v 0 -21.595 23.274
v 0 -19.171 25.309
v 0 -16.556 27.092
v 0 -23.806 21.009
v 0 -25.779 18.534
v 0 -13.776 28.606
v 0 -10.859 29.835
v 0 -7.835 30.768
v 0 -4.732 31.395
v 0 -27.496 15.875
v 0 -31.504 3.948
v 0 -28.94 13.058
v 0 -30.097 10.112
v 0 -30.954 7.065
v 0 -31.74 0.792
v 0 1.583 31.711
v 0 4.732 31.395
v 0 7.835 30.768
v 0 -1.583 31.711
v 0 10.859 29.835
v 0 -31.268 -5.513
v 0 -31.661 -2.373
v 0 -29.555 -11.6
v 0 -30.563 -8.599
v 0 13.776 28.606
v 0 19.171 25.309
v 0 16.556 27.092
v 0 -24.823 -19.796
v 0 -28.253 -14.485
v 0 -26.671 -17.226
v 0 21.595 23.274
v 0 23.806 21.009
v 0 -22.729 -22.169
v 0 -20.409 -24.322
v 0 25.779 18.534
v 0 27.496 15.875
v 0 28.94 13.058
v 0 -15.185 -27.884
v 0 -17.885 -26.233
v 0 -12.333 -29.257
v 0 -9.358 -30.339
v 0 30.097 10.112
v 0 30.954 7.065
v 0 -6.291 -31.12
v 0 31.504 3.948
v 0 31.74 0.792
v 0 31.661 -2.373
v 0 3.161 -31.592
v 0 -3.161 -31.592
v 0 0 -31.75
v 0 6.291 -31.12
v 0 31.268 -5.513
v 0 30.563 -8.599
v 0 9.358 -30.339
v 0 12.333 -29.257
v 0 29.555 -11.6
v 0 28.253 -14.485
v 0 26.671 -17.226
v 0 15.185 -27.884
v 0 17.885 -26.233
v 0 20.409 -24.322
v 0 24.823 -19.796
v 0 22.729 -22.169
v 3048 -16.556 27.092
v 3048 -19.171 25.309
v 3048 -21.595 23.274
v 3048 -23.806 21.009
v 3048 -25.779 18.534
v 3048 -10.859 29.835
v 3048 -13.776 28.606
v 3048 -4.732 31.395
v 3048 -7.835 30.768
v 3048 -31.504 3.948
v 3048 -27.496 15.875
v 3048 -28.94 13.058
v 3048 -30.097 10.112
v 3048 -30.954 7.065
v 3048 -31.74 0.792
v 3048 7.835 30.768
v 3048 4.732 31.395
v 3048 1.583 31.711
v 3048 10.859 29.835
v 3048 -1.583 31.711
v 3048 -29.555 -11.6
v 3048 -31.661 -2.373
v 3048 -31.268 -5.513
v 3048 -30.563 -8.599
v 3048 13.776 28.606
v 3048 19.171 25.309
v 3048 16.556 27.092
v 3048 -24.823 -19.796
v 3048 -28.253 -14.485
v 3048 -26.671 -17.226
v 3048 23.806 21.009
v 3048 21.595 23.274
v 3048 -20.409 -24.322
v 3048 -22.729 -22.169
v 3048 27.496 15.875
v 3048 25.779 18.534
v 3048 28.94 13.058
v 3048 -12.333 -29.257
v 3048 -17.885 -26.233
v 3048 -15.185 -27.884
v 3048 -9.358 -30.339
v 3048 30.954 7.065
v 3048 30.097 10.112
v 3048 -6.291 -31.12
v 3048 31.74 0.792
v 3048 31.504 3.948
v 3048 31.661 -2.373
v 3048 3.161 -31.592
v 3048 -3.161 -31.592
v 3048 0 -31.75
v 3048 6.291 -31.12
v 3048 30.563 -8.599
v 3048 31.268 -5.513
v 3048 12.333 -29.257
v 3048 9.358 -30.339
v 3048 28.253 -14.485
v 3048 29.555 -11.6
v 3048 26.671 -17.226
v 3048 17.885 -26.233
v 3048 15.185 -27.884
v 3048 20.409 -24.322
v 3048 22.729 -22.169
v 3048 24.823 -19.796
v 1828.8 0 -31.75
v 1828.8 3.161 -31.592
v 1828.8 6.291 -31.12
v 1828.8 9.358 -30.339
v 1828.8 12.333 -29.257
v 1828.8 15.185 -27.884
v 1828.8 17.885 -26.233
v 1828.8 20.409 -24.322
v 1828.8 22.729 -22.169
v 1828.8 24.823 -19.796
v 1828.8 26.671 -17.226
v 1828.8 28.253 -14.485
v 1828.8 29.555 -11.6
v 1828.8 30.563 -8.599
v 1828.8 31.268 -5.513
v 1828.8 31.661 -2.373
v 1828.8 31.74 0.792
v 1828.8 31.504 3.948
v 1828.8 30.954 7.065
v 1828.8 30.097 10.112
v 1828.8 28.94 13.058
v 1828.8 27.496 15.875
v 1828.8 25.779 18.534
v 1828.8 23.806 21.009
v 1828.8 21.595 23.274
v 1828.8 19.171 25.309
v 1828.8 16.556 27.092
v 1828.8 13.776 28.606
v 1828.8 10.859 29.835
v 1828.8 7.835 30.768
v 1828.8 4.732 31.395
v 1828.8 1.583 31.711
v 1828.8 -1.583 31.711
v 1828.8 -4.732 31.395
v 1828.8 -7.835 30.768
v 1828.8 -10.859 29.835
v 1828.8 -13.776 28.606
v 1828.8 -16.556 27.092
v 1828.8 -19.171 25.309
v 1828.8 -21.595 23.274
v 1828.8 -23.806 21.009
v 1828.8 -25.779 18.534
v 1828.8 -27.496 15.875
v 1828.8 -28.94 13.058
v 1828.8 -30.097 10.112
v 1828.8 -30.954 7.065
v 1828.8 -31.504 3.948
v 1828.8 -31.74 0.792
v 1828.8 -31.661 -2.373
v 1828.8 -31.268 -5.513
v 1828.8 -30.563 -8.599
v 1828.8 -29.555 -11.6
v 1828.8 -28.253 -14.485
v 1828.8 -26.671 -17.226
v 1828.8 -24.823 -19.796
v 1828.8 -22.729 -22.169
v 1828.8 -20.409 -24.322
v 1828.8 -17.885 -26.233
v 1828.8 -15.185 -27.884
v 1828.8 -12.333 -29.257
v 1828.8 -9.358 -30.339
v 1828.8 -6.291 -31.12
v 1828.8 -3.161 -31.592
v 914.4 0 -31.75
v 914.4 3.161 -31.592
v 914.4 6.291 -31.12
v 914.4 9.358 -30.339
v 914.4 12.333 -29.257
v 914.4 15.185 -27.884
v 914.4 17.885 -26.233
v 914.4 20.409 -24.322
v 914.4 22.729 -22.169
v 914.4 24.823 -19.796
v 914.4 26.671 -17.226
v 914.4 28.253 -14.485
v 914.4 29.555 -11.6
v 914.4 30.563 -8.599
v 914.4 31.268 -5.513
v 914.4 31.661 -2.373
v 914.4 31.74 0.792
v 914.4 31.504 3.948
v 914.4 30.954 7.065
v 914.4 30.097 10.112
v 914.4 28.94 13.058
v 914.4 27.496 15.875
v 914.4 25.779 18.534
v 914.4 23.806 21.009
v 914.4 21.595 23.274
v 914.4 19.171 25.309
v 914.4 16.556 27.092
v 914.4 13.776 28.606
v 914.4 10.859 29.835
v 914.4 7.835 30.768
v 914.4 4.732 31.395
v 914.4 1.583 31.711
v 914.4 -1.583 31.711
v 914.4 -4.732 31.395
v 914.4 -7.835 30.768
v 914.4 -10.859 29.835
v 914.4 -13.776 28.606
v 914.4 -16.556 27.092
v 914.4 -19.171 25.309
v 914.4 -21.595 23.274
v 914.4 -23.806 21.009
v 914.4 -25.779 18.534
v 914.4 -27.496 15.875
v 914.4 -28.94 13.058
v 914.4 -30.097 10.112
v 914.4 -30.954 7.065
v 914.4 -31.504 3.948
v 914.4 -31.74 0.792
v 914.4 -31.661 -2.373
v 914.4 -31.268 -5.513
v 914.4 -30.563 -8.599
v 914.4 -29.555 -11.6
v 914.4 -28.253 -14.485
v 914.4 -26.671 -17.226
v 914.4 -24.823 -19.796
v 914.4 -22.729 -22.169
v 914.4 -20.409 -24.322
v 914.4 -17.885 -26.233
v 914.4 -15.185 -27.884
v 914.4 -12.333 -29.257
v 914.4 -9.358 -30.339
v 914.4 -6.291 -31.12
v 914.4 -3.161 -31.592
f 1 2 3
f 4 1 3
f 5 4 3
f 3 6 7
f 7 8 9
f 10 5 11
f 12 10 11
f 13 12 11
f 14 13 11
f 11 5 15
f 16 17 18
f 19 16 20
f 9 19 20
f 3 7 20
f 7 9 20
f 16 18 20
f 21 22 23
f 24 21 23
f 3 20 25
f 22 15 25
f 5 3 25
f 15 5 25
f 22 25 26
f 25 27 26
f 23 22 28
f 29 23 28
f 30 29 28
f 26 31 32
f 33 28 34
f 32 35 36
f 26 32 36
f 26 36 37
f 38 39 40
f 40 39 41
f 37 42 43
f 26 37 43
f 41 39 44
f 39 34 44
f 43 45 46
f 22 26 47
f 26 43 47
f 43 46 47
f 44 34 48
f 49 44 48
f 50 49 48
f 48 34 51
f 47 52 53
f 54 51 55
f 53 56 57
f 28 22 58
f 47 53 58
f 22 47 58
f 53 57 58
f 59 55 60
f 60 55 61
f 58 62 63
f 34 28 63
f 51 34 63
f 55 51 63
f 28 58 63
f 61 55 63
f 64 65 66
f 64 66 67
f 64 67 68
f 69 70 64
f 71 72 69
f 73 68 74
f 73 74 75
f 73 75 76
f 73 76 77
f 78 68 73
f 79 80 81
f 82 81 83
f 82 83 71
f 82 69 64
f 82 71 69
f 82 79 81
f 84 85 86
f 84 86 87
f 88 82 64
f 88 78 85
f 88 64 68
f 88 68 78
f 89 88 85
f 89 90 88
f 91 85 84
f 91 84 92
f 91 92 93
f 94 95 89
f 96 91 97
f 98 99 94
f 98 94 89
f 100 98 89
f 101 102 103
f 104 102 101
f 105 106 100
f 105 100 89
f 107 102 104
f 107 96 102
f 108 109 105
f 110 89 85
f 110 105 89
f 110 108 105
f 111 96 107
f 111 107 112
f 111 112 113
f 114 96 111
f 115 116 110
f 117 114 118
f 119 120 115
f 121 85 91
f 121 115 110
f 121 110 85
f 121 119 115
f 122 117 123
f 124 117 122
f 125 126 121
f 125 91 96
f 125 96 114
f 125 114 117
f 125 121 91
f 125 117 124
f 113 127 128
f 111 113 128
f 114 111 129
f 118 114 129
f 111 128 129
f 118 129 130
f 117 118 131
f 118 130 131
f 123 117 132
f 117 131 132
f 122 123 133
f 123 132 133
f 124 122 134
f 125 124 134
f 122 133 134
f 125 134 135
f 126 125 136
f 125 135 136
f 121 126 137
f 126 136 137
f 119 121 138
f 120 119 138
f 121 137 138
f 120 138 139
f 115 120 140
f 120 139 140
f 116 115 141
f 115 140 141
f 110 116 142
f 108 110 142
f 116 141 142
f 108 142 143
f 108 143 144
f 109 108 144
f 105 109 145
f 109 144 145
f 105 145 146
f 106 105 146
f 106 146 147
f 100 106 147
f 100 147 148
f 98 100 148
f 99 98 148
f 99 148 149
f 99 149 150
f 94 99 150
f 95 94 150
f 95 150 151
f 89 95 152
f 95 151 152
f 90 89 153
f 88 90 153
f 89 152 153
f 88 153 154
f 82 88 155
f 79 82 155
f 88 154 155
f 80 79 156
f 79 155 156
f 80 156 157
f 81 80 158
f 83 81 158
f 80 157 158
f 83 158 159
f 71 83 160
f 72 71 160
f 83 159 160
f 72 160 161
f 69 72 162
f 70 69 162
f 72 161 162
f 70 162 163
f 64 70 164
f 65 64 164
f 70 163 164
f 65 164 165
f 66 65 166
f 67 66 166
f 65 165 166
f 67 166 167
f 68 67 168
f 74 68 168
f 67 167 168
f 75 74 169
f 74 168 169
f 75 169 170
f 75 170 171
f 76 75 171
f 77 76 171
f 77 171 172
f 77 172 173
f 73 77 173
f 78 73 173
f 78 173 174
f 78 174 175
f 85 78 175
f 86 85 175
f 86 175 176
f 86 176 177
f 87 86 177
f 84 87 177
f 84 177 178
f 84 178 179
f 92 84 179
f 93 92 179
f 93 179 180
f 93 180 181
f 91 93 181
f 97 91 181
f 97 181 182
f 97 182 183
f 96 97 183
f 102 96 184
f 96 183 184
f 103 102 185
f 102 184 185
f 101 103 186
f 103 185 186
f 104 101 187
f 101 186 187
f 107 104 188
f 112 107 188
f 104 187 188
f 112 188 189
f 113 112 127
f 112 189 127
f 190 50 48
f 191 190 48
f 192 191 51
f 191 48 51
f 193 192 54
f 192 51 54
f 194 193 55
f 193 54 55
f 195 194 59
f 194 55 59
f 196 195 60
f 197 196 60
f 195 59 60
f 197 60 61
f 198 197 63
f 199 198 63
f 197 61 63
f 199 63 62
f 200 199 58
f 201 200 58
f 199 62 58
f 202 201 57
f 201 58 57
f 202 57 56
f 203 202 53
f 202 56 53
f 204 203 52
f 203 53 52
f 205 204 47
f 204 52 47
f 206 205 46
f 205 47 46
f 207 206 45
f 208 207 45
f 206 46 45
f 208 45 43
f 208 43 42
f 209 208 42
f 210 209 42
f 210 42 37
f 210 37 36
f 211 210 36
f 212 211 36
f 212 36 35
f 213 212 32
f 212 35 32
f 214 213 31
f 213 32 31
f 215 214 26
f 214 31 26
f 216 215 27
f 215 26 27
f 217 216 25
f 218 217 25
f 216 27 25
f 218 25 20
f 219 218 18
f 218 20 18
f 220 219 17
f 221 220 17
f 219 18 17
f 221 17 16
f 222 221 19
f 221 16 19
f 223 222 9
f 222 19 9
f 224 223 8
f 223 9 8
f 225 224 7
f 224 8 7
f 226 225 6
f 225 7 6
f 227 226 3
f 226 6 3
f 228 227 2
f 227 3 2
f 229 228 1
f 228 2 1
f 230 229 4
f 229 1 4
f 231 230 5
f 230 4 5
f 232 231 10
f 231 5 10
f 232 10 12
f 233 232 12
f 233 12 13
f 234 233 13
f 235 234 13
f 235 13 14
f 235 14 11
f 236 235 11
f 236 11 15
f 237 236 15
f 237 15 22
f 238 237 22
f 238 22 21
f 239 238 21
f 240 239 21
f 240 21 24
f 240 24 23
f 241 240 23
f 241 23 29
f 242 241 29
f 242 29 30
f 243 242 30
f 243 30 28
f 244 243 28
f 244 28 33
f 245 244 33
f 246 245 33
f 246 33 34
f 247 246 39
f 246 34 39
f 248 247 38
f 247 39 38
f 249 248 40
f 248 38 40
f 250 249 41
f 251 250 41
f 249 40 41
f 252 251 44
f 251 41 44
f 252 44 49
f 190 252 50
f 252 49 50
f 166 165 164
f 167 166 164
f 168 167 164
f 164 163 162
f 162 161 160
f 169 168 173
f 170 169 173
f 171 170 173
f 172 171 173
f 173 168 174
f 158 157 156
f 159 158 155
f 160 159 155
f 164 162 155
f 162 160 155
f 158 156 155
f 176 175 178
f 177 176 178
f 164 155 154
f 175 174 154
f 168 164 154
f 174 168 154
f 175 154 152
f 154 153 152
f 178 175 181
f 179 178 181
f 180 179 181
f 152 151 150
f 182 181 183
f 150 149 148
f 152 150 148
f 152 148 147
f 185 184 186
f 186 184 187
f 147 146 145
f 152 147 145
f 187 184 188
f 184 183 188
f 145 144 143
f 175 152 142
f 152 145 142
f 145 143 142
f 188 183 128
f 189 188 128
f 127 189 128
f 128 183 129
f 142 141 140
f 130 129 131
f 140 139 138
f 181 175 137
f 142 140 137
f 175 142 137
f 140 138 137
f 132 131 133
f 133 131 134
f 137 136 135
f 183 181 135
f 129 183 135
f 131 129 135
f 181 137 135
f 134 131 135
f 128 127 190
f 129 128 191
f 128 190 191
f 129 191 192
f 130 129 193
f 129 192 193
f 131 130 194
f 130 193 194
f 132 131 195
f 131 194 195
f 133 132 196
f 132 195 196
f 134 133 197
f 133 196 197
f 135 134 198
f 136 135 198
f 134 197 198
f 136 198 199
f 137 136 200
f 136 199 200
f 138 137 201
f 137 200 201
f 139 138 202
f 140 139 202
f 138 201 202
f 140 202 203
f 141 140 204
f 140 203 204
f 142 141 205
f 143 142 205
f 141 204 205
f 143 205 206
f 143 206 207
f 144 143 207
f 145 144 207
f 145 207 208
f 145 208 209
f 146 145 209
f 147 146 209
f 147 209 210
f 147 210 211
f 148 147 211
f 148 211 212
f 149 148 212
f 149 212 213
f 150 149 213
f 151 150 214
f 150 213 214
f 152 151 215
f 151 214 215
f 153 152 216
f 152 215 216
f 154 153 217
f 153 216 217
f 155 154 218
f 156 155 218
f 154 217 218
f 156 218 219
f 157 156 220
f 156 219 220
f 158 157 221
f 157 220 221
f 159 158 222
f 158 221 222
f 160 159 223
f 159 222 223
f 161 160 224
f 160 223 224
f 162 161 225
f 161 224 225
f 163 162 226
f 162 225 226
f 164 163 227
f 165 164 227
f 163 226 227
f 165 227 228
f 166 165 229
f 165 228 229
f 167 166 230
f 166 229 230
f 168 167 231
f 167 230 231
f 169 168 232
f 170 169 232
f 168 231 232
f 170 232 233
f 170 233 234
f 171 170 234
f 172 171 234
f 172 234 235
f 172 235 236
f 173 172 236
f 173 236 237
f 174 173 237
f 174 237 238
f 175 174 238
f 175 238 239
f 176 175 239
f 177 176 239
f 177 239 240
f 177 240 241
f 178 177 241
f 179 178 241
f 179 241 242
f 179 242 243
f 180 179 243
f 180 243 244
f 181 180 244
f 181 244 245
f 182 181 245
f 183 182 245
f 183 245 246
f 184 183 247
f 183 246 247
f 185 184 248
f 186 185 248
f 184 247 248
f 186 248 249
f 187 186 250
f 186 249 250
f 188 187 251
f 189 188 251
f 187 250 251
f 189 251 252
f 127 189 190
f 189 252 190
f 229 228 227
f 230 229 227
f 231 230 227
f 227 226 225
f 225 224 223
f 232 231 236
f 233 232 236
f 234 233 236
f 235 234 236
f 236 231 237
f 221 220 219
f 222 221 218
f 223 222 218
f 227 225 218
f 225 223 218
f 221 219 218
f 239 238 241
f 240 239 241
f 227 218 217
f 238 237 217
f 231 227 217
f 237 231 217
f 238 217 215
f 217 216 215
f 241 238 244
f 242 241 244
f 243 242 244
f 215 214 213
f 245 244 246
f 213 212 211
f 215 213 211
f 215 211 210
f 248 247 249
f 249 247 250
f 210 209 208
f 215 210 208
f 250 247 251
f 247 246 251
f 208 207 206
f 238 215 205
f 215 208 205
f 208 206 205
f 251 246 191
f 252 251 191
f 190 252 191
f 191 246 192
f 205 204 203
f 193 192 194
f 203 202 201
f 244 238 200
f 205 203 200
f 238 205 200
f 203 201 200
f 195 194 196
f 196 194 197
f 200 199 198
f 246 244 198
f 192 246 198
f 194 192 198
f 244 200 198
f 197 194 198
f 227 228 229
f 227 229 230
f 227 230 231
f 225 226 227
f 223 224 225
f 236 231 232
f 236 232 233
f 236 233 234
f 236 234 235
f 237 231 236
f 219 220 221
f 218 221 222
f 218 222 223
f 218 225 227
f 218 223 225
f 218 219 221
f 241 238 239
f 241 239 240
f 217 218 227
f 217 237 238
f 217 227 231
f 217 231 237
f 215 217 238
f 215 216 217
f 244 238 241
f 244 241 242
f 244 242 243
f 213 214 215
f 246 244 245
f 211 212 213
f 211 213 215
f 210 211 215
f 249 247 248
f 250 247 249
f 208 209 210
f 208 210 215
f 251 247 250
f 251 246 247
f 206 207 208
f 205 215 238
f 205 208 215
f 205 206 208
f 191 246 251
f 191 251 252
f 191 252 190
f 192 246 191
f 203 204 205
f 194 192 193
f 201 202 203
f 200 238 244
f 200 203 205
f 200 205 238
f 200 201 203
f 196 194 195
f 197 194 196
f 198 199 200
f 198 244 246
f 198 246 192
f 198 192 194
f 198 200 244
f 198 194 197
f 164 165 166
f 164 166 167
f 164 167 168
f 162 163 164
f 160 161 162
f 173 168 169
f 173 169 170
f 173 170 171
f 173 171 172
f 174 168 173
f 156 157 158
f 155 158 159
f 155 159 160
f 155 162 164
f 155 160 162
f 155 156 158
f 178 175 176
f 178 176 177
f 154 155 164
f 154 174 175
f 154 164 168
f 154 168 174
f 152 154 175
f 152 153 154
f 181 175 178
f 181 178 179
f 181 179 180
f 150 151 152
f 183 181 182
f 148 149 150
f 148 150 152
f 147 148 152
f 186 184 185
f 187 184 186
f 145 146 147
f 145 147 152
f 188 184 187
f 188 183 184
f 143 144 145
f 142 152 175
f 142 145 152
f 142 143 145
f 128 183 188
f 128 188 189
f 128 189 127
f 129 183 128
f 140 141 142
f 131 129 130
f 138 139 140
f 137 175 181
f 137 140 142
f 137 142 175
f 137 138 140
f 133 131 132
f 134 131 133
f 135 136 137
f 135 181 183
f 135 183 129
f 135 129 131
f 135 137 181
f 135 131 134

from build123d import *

# Parameters (mm, degrees)
SKETCH2_R           = 31.75
BOSS_EXTRUDE1_DEPTH = 914.4
BOSS_EXTRUDE2_START = 914.4
SKETCH2_2_R         = 31.75
BOSS_EXTRUDE2_DEPTH = 914.4
BOSS_EXTRUDE3_START = 1828.8
SKETCH2_3_R         = 31.75
BOSS_EXTRUDE3_DEPTH = 1219.2


with BuildPart() as part:
    # Sketch2 → Boss-Extrude1 (new body)
    with BuildSketch(Plane(origin=(0, 0, 0), x_dir=(0, 0, -1), z_dir=(1, 0, 0))):
        Circle(SKETCH2_R)
    extrude(amount=BOSS_EXTRUDE1_DEPTH)


with BuildPart() as body_2:
    # Sketch2<2> → Boss-Extrude2 (new body)
    with BuildSketch(Plane(origin=(0, 0, 0), x_dir=(0, 0, -1), z_dir=(1, 0, 0)).offset(BOSS_EXTRUDE2_START)):
        Circle(SKETCH2_2_R)
    extrude(amount=BOSS_EXTRUDE2_DEPTH)


with BuildPart() as body_3:
    # Sketch2<3> → Boss-Extrude3 (new body)
    with BuildSketch(Plane(origin=(0, 0, 0), x_dir=(0, 0, -1), z_dir=(1, 0, 0)).offset(BOSS_EXTRUDE3_START)):
        Circle(SKETCH2_3_R)
    extrude(amount=BOSS_EXTRUDE3_DEPTH)


solid = Compound([part.part, body_2.part, body_3.part])
